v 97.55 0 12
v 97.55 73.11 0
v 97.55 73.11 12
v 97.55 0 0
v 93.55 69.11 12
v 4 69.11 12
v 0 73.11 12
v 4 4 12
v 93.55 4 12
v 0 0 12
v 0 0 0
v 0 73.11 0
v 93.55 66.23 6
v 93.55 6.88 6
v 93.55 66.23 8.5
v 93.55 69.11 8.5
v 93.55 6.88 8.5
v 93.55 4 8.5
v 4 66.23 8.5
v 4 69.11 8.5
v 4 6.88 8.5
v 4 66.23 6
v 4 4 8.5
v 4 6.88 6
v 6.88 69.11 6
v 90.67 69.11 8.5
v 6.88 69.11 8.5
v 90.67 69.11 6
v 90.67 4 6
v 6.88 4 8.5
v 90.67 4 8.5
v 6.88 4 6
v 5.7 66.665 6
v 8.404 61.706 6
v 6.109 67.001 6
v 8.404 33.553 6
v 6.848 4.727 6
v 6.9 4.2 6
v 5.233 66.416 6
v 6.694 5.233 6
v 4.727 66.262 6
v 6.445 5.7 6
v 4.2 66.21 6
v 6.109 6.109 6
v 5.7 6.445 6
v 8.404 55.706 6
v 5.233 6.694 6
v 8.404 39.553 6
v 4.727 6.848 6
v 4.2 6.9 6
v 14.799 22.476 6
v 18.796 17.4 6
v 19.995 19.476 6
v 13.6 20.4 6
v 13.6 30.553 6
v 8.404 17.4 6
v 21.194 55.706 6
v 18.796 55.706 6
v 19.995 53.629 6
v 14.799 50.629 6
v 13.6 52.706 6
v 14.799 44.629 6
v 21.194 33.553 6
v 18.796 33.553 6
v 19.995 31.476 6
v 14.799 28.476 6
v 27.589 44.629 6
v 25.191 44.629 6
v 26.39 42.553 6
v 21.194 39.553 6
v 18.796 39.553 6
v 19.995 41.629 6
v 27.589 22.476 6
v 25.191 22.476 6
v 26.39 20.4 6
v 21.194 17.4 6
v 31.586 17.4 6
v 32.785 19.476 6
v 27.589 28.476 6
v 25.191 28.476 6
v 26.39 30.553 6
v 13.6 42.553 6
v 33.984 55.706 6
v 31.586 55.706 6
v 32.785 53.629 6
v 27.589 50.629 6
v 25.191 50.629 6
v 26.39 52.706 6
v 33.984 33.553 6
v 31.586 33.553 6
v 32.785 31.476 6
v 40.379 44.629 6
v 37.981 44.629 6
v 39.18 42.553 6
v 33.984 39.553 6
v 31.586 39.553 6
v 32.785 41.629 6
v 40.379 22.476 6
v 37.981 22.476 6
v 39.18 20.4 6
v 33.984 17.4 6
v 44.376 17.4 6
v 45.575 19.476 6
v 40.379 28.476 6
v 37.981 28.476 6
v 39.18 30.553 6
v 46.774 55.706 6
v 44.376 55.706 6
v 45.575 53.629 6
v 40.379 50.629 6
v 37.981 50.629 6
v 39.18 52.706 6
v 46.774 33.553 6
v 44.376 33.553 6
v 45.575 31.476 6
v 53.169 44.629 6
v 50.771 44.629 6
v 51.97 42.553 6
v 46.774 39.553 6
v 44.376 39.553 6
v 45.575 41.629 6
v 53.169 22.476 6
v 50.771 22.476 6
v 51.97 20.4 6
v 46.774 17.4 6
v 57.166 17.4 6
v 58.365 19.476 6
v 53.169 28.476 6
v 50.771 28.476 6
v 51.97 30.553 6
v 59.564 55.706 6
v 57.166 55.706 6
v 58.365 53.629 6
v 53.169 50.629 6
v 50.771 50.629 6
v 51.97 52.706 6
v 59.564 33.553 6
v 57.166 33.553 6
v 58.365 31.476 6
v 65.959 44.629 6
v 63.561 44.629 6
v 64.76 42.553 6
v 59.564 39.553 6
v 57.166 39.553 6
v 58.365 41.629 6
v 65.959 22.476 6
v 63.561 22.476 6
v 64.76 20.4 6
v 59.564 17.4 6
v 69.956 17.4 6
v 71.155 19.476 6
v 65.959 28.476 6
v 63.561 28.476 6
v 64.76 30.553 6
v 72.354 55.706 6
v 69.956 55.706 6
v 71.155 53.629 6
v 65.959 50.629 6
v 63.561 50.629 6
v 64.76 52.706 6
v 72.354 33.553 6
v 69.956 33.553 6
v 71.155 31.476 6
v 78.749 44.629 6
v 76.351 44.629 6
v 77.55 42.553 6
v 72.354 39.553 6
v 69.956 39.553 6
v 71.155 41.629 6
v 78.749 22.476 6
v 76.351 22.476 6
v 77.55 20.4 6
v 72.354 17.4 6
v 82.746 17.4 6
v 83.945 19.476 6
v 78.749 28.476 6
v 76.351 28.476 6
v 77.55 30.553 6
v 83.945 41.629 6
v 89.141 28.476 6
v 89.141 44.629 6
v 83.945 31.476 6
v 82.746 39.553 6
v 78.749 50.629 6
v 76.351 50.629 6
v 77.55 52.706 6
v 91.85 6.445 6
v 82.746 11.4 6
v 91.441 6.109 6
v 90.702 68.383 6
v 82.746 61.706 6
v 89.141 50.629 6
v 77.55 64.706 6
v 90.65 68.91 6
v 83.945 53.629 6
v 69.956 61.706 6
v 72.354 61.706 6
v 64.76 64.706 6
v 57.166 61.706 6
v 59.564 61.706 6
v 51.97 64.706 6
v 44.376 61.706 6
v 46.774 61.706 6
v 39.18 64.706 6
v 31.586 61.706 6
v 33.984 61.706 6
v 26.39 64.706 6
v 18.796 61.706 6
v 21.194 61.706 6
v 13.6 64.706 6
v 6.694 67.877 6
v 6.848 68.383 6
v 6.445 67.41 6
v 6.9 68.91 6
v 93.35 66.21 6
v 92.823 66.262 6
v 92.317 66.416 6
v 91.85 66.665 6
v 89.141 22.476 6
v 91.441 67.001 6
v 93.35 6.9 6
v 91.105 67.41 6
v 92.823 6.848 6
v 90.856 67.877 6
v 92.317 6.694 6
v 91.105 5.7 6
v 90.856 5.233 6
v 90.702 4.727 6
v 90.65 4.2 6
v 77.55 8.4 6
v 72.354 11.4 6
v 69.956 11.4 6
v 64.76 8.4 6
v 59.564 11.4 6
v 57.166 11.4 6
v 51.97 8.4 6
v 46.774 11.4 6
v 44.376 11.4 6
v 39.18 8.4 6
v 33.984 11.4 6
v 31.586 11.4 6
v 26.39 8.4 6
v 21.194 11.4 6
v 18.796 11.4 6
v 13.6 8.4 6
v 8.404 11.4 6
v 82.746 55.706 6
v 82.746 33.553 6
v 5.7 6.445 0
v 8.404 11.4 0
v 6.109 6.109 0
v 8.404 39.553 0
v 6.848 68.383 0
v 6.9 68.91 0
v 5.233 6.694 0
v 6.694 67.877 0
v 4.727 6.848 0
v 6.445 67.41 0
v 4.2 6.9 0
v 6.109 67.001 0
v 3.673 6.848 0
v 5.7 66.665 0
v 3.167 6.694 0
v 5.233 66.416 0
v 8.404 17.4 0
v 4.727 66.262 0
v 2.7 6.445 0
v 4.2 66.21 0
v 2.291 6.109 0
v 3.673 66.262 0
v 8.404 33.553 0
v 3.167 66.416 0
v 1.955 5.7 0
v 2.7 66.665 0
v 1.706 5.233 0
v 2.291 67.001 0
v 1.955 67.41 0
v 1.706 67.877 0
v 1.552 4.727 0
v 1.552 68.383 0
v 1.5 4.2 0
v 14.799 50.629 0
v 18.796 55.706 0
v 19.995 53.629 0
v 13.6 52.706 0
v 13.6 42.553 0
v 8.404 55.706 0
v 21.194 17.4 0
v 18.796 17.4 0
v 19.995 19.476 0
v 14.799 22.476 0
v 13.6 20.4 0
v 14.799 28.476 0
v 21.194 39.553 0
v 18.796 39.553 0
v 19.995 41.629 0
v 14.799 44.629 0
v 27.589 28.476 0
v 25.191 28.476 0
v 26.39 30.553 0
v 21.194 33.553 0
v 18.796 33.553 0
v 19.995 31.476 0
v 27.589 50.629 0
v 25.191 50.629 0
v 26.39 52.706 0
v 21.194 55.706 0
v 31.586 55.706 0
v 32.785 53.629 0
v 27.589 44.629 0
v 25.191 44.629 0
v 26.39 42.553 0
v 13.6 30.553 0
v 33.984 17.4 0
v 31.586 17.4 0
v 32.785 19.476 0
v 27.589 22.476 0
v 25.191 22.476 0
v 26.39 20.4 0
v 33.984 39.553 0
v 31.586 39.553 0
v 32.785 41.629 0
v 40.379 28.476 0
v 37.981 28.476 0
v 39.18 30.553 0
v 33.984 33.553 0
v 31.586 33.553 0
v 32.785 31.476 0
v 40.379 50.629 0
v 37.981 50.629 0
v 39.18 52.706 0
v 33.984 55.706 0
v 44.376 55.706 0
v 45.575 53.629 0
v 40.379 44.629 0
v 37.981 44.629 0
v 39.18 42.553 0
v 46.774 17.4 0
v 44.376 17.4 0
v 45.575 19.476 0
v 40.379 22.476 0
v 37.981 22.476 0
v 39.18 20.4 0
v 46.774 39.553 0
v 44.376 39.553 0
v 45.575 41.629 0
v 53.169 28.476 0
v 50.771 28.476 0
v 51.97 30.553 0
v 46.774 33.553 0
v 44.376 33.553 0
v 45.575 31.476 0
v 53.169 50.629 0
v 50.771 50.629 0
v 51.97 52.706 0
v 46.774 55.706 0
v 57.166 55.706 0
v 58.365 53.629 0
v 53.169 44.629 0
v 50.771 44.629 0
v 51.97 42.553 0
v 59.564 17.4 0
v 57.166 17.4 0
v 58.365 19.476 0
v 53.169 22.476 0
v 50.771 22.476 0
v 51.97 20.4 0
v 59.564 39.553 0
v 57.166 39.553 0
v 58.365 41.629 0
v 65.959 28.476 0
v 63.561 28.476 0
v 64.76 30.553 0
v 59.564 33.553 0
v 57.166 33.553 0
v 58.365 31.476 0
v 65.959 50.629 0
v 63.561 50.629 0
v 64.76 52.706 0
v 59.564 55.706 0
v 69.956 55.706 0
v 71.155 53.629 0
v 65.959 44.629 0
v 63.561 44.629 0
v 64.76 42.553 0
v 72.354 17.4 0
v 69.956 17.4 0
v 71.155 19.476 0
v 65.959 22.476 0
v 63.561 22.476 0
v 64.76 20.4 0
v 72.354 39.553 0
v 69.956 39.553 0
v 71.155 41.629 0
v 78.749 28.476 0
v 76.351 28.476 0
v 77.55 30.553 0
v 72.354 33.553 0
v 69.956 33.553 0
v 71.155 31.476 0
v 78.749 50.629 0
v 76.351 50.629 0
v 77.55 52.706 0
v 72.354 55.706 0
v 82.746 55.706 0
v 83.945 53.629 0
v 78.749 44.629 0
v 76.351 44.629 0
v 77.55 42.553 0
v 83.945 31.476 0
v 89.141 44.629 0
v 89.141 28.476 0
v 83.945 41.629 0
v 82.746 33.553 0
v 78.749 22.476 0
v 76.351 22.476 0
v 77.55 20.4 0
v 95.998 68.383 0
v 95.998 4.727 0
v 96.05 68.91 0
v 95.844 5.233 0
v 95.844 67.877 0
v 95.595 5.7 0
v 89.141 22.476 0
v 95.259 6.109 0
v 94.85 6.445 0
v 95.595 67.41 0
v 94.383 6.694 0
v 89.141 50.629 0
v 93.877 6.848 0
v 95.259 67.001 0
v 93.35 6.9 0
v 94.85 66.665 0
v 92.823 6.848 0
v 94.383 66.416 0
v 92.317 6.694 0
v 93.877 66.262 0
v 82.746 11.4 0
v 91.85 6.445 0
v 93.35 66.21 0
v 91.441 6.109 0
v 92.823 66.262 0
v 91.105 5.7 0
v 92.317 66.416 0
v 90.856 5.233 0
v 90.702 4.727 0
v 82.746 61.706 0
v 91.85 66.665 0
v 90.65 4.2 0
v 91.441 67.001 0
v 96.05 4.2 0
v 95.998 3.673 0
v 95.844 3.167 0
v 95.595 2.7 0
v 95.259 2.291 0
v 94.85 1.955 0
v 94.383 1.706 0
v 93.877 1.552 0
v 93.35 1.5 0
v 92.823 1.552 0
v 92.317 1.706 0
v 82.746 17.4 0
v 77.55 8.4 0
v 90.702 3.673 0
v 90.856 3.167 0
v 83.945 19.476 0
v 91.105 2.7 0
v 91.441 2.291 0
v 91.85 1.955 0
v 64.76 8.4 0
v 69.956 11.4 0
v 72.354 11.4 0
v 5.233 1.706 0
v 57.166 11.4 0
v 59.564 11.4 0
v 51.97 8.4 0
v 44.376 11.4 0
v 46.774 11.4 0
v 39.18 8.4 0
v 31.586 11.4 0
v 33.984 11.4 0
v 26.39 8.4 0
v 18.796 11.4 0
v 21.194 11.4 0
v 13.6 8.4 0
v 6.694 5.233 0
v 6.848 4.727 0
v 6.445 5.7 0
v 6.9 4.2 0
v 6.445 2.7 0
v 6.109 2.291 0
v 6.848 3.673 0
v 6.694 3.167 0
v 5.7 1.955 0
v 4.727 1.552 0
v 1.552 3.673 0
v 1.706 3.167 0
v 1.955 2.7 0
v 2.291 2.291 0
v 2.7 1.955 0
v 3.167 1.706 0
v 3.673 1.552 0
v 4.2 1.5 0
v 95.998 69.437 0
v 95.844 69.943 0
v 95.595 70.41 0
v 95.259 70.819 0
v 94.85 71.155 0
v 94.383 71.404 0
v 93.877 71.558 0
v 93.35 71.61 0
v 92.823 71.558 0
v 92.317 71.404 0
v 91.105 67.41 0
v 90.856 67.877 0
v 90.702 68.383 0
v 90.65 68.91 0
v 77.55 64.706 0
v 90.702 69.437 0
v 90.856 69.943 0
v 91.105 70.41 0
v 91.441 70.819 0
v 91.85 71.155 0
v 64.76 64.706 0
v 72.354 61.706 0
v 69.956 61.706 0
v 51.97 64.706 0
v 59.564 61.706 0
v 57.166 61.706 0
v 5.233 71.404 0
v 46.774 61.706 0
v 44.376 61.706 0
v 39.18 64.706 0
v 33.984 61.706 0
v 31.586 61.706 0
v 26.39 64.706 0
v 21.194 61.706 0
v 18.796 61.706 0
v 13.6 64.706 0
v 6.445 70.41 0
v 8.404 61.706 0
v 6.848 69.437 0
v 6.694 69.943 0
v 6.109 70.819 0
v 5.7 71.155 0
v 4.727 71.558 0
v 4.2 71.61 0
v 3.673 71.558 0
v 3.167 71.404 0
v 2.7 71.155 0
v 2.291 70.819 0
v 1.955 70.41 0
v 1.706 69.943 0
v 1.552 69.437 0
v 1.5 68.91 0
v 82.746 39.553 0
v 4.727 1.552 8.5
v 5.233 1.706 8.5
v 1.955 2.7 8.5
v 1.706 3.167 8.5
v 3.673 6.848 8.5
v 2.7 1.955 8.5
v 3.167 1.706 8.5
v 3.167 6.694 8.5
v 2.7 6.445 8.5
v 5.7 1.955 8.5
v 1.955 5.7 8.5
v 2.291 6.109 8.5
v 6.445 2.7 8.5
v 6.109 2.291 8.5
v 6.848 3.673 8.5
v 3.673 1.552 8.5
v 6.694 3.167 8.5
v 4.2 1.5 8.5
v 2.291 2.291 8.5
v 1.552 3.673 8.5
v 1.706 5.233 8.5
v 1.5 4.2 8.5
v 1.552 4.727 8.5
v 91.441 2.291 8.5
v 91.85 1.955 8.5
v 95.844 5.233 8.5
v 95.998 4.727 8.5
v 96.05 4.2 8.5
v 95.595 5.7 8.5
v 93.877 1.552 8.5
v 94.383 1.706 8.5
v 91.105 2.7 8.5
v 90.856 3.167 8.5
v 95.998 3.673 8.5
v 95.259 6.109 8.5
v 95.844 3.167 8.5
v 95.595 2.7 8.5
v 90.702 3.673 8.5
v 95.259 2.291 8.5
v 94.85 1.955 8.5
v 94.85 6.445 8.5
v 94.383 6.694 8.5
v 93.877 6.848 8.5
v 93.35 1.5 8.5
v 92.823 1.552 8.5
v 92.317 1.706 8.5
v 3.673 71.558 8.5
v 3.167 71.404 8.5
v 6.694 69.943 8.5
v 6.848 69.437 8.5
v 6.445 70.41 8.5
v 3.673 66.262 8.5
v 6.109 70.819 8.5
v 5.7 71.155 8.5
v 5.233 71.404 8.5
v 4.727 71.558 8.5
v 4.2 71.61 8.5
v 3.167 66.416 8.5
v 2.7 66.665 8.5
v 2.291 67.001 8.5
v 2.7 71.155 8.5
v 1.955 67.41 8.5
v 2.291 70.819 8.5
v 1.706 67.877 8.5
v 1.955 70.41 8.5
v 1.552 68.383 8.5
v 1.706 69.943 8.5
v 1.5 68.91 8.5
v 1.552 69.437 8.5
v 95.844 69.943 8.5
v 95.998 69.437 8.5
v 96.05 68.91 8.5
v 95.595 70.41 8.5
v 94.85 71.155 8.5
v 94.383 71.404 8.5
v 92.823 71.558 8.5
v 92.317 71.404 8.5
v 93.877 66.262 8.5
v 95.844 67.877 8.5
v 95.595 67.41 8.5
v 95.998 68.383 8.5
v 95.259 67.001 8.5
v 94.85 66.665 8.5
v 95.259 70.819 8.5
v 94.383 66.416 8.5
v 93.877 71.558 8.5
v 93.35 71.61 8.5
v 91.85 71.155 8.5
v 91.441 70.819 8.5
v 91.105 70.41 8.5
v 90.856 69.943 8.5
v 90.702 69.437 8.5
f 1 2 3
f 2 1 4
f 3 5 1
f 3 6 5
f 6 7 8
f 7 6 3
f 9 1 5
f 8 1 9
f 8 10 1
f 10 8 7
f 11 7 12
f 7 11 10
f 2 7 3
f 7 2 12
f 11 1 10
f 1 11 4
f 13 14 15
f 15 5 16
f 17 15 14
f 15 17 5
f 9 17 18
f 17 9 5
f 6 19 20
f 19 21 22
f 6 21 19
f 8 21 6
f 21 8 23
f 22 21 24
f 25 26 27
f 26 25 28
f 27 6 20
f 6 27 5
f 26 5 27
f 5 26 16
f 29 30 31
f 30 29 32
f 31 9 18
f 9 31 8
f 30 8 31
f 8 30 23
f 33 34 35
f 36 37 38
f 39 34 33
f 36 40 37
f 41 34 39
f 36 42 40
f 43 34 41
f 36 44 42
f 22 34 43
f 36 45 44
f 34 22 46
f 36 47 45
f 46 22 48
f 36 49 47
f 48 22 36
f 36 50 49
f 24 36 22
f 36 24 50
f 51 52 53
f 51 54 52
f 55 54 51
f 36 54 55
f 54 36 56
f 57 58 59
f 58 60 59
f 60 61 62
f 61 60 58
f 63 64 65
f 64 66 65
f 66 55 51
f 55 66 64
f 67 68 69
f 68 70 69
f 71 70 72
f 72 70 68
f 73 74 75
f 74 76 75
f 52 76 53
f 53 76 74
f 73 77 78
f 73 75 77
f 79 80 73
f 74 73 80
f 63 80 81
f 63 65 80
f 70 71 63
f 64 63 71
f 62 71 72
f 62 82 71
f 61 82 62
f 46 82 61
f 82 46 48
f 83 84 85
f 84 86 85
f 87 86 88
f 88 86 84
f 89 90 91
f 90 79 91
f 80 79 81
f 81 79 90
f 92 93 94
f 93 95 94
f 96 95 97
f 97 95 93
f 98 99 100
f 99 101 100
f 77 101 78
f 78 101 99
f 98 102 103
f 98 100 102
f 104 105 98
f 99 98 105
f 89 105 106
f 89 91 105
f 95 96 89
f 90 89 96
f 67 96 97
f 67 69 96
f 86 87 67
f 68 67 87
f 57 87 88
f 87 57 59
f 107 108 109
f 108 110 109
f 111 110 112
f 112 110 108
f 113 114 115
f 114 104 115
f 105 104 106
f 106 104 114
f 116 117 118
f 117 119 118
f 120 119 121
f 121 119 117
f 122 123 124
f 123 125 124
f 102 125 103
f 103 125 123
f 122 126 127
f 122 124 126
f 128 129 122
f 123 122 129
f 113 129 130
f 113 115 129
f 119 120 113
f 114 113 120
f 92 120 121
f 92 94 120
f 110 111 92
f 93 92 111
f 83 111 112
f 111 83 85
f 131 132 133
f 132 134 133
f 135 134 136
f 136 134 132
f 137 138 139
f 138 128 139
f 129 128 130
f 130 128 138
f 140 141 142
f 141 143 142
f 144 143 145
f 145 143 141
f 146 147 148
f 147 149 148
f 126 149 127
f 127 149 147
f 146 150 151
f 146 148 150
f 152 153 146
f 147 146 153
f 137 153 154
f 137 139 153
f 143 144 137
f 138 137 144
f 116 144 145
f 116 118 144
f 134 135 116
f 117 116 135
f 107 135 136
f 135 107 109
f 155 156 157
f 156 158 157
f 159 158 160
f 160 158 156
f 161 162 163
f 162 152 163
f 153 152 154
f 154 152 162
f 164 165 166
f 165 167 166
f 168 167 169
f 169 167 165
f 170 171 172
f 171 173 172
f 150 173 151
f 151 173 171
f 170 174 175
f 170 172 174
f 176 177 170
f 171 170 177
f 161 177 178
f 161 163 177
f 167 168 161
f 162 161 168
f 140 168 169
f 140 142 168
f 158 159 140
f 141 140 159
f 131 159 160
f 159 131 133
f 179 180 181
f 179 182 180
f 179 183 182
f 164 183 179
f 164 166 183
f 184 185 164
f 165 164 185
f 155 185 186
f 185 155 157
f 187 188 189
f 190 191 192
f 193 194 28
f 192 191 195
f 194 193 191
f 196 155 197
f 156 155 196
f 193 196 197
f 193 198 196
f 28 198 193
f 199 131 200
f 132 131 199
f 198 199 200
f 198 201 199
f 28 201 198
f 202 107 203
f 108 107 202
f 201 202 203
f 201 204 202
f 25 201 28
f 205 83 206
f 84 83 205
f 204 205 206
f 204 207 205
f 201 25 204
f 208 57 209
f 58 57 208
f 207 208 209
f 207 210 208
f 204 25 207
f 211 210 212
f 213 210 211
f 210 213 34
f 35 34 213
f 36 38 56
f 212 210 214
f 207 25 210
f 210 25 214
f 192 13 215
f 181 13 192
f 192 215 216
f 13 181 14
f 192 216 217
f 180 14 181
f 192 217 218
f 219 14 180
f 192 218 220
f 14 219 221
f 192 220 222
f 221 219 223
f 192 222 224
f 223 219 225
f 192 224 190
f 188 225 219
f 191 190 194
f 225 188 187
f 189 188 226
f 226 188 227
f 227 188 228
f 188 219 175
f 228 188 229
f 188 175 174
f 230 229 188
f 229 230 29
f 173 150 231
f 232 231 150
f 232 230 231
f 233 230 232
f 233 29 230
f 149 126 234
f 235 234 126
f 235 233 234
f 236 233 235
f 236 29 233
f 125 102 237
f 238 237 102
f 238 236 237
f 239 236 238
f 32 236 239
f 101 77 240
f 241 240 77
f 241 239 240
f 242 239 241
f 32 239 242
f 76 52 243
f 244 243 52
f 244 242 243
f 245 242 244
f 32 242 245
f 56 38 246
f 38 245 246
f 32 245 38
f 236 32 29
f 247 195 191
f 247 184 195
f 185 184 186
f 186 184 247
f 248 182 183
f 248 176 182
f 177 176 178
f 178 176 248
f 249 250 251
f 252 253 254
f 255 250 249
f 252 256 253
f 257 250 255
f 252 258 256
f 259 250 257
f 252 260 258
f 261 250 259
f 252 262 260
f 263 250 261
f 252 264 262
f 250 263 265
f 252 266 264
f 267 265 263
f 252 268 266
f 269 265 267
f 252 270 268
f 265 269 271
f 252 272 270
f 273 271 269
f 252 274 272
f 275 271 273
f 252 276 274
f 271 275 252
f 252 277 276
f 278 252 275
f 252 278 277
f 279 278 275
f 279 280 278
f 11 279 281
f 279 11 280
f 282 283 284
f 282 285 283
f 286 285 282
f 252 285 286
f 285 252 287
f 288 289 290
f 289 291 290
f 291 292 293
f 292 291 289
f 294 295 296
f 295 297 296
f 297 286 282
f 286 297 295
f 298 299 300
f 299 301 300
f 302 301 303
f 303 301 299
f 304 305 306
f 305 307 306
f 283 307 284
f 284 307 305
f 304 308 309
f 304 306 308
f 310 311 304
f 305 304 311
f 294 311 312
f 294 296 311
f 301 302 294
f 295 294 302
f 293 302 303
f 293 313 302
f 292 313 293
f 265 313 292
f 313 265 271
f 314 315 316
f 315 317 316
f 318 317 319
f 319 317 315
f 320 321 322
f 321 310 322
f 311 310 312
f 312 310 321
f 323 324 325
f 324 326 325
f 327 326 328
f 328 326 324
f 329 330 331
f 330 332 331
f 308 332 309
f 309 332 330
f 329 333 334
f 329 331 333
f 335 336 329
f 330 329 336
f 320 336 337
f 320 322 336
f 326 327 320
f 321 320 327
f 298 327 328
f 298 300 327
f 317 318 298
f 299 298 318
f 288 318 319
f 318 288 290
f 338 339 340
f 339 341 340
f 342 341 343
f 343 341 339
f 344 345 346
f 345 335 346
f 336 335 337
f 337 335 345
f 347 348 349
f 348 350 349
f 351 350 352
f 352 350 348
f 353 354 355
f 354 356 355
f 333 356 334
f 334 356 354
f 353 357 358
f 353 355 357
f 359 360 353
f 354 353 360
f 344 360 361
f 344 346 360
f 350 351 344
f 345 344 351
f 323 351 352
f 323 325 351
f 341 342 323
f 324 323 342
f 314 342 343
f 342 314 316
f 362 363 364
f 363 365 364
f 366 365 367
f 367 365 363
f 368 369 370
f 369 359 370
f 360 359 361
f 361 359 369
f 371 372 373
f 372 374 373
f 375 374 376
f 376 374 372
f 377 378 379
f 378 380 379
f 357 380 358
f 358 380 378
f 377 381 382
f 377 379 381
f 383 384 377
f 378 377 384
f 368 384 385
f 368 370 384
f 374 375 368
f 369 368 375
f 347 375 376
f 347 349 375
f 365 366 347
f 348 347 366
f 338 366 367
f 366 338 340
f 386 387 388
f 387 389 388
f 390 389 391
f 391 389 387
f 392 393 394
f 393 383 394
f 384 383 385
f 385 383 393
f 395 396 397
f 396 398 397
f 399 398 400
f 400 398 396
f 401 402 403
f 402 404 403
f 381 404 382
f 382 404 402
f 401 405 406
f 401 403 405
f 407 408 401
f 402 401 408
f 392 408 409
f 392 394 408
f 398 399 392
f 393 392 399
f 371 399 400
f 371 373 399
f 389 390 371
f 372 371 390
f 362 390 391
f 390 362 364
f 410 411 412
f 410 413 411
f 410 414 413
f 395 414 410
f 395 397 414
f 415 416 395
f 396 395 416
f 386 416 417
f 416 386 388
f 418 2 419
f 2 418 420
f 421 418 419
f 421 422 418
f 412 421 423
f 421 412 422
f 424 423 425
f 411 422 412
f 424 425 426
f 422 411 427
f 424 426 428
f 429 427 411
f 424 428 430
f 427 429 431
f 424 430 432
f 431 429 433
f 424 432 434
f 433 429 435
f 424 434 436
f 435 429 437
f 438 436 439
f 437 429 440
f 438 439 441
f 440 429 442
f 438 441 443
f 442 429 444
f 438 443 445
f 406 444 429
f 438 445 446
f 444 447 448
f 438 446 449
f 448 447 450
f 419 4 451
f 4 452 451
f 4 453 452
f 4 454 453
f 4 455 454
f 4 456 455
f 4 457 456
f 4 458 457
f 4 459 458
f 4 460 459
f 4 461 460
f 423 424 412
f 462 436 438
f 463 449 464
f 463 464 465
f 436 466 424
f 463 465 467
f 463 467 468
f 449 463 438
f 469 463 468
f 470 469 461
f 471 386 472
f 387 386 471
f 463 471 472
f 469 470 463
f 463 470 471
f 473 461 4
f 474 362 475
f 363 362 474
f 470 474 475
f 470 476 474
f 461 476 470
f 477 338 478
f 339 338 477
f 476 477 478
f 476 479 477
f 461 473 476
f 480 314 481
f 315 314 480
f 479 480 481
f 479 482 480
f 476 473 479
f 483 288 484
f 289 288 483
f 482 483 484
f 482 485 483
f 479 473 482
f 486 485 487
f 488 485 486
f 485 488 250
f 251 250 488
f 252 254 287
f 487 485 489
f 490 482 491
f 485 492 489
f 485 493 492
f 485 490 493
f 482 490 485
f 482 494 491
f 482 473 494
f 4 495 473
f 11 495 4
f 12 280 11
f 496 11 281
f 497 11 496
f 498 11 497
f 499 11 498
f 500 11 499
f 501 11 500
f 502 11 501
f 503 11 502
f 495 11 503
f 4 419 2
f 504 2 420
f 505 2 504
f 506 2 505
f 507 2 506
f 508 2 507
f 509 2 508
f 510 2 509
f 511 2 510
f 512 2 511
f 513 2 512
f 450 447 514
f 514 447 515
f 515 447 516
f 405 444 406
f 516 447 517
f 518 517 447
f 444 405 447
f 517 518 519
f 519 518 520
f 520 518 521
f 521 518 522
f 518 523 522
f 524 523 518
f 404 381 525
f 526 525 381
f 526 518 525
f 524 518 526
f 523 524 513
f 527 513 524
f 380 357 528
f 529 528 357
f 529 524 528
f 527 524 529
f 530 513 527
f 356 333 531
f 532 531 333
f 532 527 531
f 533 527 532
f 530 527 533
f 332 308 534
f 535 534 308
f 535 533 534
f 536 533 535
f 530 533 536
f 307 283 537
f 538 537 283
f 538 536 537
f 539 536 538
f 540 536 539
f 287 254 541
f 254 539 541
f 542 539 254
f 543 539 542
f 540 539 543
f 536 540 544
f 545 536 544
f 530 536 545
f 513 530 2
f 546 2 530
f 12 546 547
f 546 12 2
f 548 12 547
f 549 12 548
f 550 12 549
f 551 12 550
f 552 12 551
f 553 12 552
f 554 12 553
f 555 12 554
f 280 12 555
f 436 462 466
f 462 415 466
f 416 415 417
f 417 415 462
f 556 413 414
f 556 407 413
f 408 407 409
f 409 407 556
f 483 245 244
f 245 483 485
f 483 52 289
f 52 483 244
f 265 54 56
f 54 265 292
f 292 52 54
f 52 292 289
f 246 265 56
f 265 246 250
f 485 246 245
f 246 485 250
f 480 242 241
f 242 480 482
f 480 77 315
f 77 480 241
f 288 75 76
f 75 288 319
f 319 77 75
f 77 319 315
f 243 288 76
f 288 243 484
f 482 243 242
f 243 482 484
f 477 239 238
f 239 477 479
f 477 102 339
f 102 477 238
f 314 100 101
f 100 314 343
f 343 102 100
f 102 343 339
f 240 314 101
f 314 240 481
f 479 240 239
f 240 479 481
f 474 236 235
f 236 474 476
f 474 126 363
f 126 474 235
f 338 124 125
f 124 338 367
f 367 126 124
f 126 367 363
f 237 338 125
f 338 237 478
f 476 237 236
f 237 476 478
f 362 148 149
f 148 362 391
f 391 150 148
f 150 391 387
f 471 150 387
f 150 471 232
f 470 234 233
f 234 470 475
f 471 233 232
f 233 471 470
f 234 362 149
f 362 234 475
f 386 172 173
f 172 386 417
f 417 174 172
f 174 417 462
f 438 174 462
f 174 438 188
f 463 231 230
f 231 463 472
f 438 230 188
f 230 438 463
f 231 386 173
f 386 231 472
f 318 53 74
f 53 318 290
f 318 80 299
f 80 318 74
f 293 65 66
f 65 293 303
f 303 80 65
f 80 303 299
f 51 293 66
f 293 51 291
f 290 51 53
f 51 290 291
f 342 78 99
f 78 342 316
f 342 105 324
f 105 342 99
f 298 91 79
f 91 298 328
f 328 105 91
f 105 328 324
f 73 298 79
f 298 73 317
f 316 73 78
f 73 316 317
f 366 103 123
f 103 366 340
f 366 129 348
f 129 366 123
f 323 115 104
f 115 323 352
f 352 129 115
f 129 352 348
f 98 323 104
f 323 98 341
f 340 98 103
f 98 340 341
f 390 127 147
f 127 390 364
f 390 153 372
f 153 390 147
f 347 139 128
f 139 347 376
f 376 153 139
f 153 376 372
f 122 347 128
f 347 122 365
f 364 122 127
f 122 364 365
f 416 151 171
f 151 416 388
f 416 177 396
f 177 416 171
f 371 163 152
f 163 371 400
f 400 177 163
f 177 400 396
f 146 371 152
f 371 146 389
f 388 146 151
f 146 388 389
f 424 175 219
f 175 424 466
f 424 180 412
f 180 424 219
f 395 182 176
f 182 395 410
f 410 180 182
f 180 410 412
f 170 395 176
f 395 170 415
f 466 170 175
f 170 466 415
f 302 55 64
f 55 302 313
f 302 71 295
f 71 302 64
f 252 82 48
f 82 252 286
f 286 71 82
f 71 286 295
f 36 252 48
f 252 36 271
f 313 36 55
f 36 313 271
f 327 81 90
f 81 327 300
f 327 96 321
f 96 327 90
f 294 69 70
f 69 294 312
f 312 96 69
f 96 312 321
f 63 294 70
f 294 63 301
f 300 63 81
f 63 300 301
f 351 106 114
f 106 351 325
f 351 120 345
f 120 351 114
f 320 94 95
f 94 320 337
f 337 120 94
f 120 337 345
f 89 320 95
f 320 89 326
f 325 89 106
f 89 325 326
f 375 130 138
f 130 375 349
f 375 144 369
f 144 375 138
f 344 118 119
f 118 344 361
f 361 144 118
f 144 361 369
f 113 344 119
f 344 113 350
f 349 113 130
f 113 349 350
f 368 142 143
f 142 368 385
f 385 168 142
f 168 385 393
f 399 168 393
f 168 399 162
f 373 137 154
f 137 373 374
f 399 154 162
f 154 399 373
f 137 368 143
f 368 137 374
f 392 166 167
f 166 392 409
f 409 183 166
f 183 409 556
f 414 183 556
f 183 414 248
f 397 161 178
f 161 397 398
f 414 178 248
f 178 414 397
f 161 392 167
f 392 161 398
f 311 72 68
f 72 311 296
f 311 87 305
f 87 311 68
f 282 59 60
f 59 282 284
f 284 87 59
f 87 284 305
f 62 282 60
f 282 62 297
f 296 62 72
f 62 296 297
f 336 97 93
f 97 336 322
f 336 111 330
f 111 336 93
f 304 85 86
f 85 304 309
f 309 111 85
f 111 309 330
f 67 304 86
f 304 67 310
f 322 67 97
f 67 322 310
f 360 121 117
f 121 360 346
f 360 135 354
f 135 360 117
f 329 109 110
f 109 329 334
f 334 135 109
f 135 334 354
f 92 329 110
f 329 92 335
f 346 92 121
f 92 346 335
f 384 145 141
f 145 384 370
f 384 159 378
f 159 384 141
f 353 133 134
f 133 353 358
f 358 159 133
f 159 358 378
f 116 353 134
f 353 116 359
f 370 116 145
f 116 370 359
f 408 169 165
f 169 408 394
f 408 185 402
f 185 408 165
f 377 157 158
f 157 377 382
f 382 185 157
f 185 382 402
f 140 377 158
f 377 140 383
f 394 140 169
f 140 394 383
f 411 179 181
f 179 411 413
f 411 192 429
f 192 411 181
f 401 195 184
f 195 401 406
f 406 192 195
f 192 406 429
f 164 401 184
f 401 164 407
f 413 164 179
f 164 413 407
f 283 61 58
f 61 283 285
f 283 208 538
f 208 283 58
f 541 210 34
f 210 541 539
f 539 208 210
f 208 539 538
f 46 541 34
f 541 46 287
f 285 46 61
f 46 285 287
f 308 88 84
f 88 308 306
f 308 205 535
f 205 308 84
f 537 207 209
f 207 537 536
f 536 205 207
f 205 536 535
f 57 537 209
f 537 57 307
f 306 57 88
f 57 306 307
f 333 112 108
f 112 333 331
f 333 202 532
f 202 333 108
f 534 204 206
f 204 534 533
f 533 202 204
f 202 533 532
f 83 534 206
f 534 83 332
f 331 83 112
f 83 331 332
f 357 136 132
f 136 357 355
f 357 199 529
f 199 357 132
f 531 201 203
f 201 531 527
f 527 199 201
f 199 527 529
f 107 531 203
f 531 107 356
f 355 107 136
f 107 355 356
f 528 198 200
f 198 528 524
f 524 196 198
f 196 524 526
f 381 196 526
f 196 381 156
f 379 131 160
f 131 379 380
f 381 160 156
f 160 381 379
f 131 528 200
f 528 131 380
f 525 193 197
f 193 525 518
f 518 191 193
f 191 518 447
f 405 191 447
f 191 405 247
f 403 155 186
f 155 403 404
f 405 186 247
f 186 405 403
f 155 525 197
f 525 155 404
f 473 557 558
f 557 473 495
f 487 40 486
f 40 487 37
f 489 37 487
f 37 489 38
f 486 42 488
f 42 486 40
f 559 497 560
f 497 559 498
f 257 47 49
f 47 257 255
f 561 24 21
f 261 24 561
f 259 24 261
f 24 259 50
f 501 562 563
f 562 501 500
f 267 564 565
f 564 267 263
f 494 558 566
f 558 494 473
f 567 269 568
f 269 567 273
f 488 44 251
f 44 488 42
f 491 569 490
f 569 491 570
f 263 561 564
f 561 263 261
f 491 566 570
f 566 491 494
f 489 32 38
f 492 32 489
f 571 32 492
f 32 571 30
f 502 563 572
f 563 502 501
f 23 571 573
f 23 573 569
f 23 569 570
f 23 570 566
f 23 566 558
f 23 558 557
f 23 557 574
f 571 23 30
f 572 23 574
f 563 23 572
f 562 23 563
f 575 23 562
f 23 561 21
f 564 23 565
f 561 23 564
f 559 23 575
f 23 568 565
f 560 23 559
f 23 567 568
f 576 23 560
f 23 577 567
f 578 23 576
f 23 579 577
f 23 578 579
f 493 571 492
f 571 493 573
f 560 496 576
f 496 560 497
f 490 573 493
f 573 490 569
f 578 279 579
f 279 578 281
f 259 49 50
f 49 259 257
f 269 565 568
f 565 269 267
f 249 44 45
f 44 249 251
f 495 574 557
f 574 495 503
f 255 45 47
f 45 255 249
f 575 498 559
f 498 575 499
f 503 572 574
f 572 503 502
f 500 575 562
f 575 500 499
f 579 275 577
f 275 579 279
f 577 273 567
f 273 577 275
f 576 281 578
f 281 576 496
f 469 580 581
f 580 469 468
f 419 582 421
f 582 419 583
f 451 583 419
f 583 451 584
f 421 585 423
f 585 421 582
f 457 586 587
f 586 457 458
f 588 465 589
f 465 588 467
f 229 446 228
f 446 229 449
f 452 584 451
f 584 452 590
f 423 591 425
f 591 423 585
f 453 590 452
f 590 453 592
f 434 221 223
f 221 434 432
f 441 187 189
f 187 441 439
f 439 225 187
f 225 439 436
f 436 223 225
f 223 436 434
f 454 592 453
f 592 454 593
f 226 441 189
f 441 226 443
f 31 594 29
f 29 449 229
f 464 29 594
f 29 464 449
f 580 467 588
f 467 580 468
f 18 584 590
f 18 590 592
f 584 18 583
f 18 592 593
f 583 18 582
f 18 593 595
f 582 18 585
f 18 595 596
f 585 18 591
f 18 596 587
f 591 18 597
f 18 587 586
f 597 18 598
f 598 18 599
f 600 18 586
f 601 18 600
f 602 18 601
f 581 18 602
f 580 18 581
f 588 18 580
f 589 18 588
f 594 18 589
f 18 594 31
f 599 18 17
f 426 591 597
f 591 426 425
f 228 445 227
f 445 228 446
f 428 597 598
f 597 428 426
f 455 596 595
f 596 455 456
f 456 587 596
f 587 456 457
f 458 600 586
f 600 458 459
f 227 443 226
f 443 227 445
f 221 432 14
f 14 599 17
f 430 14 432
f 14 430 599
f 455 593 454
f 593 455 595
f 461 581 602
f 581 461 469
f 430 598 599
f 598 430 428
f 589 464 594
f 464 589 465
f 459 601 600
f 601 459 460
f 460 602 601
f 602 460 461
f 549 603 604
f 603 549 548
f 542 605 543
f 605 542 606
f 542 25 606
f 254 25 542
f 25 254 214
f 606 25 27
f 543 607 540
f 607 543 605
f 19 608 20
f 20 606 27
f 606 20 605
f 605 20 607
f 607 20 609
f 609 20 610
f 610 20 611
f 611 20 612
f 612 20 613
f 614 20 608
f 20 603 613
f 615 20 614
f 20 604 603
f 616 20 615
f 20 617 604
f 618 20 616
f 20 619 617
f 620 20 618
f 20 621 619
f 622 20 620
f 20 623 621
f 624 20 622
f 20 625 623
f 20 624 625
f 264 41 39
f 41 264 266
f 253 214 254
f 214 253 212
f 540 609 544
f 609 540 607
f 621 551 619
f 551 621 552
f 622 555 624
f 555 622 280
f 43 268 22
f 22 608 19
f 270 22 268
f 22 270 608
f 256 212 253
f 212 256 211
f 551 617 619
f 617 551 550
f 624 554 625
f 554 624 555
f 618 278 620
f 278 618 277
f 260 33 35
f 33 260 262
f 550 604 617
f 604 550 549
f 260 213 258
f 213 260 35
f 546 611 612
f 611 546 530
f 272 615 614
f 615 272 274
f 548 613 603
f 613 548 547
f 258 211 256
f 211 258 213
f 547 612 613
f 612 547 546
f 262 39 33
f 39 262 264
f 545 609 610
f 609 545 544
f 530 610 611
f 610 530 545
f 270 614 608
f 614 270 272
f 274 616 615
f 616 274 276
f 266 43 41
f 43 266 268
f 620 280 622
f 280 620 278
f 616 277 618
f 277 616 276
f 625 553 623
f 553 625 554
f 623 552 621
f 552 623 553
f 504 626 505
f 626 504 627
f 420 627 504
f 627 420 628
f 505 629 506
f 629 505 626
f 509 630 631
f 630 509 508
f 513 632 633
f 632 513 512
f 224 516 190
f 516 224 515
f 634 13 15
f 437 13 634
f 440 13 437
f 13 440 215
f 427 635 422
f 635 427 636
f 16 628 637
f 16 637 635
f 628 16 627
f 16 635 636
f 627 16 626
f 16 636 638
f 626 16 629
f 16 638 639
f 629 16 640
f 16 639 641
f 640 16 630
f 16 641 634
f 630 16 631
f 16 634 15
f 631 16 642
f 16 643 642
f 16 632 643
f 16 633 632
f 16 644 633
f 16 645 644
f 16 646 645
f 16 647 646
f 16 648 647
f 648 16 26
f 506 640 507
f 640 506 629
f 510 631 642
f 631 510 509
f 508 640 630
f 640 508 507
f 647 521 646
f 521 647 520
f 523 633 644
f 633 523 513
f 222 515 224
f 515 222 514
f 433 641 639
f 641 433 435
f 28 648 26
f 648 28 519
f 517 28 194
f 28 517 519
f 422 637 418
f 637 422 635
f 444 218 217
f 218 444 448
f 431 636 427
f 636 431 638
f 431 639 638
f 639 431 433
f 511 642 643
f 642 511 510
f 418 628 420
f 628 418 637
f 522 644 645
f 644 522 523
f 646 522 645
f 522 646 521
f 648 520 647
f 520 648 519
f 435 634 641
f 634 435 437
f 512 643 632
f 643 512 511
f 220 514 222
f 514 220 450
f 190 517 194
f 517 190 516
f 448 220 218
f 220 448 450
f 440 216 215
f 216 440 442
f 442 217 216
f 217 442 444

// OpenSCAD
$fn = 32;

// ----------------------------------------------------------------------
// Honeycomb panel: 97.55 x 73.11 mm, 30 cells of 12 mm
// ----------------------------------------------------------------------

// --- parameters (mm) ---
panel_w = 97.55;          // panel width
panel_d = 73.11;          // panel depth
thick = 6;                // panel thickness
cell_r = 6;               // hex cell circumradius
pitch = 12.79;            // hex cell pitch (centre to centre)
web = 2.4;                // web between the cells
columns = 6;              // columns of cells
rows = 5;                 // rows of cells
cell_count = 30;          // total cells
shift_x = 13.6;           // first cell offset in x
shift_y = 14.4;           // first cell offset in y
mount_d = 5.4;            // corner mounting holes
hole_off = 4.2;           // mounting hole offset from the corners
rim_h = 12;               // rim height
rim_t = 4;                // rim wall thickness

difference() {
  union() {
    cube([panel_w, panel_d, thick]);
    /* rim around the panel, sunk 1 mm into the plate */
    translate([0, 0, thick - 1]) difference() {
      cube([panel_w, panel_d, rim_h - thick + 1]);
      translate([rim_t, rim_t, -2.5]) cube([panel_w - 2 * rim_t, panel_d - 2 * rim_t, rim_h - thick + 6]);
    }
  }
  /* hexagonal cells, point-up, cut right through the plate */
  for (row = [0 : rows - 1]) {
    for (col = [0 : columns - 1]) {
      translate([shift_x + col * pitch + (row % 2) * pitch / 2, shift_y + row * pitch * 0.866025, -2.5]) rotate([0, 0, 30]) cylinder(h = thick + 5, d = 2 * cell_r, $fn = 6);
    }
  }
  /* corner mounting holes, clear of the outer cell web */
  translate([4.2, 4.2, -2.5]) cylinder(h = thick + 5, d = mount_d);
  translate([93.35, 4.2, -2.5]) cylinder(h = thick + 5, d = mount_d);
  translate([4.2, 68.91, -2.5]) cylinder(h = thick + 5, d = mount_d);
  translate([93.35, 68.91, -2.5]) cylinder(h = thick + 5, d = mount_d);
}
